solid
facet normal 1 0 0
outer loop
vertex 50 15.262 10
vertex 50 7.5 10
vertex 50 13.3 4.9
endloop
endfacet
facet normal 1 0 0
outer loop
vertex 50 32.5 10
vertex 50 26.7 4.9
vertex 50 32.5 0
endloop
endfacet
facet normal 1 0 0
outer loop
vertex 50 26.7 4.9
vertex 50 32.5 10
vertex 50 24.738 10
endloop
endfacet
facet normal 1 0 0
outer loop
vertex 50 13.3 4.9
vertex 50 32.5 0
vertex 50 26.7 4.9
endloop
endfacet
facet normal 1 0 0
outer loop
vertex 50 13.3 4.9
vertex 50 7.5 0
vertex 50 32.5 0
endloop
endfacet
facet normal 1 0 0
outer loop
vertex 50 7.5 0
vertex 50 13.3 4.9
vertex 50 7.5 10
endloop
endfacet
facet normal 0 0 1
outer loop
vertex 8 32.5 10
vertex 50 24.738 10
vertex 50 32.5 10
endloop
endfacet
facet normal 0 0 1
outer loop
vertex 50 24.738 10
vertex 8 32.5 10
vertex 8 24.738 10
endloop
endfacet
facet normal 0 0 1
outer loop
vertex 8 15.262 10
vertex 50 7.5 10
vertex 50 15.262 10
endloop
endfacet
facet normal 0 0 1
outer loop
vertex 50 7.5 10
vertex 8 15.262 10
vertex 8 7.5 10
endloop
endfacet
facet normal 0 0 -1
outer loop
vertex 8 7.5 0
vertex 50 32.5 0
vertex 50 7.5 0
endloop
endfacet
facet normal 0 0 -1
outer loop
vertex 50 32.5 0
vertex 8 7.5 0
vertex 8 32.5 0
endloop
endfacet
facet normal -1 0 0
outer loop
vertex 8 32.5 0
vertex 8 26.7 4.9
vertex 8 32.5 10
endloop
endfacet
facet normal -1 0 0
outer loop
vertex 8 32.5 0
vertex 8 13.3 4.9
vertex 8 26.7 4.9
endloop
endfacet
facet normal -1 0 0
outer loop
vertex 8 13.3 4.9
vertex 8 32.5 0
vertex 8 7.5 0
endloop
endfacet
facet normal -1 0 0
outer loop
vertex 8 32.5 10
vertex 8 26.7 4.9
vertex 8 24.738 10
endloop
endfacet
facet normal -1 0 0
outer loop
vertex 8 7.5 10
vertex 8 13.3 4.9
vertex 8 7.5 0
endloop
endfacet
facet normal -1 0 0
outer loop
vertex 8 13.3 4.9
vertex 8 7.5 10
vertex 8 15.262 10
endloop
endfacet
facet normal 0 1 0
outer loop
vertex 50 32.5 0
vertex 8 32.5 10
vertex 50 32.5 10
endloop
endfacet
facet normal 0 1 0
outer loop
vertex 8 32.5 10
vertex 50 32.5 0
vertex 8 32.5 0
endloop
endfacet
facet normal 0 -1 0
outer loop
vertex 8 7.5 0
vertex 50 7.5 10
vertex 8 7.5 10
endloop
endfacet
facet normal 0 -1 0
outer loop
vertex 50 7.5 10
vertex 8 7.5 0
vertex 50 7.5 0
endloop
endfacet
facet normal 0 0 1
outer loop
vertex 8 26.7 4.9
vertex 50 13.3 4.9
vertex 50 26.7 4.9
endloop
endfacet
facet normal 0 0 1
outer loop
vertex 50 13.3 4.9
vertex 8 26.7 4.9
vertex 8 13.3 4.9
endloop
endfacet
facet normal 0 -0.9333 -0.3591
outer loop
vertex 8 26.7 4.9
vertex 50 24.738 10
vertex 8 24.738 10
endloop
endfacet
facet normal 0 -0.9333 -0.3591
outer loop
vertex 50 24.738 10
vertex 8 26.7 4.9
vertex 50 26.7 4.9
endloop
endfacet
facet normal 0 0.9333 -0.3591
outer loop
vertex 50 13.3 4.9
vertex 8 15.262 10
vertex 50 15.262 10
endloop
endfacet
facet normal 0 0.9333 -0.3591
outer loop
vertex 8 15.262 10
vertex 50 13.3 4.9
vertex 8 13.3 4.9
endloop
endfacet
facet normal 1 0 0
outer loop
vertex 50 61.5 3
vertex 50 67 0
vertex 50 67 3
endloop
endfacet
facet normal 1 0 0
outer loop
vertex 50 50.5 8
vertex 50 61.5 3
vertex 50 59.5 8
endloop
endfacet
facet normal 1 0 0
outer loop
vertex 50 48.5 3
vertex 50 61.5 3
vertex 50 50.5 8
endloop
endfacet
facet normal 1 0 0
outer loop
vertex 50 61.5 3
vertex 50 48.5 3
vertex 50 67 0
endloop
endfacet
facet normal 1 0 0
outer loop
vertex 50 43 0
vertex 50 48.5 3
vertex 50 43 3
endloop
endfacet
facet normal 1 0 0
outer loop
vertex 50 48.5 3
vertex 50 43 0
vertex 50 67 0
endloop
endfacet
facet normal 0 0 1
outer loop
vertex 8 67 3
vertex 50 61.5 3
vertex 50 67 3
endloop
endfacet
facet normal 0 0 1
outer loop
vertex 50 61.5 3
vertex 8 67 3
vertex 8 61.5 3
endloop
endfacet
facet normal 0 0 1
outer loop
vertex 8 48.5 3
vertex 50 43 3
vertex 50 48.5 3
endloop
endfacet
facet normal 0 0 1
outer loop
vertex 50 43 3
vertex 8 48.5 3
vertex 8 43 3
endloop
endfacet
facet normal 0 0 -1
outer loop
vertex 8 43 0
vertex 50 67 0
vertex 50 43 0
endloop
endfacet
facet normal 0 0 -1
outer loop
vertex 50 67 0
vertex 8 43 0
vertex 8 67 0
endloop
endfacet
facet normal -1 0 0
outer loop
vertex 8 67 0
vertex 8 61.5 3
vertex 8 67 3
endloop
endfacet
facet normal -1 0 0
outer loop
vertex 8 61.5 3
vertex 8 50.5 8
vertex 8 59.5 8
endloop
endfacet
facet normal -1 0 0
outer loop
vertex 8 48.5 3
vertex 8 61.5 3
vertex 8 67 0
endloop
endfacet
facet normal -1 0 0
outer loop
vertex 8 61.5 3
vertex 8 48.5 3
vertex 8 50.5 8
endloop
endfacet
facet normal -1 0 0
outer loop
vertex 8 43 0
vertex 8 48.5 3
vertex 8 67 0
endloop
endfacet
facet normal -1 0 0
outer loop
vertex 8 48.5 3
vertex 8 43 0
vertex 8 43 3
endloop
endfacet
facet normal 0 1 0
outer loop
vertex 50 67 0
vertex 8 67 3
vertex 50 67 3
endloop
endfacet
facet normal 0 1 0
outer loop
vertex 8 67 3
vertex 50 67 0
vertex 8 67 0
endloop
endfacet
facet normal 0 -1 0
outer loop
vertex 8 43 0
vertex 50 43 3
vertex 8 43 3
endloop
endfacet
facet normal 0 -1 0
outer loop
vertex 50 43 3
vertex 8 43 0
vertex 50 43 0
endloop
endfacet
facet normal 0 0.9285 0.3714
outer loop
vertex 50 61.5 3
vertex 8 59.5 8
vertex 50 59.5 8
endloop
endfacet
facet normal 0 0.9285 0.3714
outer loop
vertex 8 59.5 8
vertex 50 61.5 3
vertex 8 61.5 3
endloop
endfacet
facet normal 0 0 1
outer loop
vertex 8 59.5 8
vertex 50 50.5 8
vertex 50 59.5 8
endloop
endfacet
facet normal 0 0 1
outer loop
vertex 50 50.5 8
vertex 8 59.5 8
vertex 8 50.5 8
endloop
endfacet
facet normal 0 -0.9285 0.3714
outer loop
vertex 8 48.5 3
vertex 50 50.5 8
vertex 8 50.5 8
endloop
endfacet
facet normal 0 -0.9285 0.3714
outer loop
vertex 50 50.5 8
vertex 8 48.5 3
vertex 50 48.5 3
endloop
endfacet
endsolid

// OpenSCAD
/*
Sample 051: Schwalbenschwanz-Verbinder — standard 0,20 mm
Generated from the FDM Mechanical Sample Library.
Units: millimetres.

Override examples:
  openscad -o custom.stl -D 'view="plate"' -D 'render_fn=64' model.scad
  openscad -o preview.png -D 'view="assembly"' model.scad
*/
use <../../../library/fdm_mechanisms.scad>

render_fn = is_undef(render_fn) ? 48 : render_fn;
view = is_undef(view) ? "plate" : view;
$fn = render_fn;

sample_dovetail_joiner(
    view=view,
    clearance=0.2,
    length=42
);
